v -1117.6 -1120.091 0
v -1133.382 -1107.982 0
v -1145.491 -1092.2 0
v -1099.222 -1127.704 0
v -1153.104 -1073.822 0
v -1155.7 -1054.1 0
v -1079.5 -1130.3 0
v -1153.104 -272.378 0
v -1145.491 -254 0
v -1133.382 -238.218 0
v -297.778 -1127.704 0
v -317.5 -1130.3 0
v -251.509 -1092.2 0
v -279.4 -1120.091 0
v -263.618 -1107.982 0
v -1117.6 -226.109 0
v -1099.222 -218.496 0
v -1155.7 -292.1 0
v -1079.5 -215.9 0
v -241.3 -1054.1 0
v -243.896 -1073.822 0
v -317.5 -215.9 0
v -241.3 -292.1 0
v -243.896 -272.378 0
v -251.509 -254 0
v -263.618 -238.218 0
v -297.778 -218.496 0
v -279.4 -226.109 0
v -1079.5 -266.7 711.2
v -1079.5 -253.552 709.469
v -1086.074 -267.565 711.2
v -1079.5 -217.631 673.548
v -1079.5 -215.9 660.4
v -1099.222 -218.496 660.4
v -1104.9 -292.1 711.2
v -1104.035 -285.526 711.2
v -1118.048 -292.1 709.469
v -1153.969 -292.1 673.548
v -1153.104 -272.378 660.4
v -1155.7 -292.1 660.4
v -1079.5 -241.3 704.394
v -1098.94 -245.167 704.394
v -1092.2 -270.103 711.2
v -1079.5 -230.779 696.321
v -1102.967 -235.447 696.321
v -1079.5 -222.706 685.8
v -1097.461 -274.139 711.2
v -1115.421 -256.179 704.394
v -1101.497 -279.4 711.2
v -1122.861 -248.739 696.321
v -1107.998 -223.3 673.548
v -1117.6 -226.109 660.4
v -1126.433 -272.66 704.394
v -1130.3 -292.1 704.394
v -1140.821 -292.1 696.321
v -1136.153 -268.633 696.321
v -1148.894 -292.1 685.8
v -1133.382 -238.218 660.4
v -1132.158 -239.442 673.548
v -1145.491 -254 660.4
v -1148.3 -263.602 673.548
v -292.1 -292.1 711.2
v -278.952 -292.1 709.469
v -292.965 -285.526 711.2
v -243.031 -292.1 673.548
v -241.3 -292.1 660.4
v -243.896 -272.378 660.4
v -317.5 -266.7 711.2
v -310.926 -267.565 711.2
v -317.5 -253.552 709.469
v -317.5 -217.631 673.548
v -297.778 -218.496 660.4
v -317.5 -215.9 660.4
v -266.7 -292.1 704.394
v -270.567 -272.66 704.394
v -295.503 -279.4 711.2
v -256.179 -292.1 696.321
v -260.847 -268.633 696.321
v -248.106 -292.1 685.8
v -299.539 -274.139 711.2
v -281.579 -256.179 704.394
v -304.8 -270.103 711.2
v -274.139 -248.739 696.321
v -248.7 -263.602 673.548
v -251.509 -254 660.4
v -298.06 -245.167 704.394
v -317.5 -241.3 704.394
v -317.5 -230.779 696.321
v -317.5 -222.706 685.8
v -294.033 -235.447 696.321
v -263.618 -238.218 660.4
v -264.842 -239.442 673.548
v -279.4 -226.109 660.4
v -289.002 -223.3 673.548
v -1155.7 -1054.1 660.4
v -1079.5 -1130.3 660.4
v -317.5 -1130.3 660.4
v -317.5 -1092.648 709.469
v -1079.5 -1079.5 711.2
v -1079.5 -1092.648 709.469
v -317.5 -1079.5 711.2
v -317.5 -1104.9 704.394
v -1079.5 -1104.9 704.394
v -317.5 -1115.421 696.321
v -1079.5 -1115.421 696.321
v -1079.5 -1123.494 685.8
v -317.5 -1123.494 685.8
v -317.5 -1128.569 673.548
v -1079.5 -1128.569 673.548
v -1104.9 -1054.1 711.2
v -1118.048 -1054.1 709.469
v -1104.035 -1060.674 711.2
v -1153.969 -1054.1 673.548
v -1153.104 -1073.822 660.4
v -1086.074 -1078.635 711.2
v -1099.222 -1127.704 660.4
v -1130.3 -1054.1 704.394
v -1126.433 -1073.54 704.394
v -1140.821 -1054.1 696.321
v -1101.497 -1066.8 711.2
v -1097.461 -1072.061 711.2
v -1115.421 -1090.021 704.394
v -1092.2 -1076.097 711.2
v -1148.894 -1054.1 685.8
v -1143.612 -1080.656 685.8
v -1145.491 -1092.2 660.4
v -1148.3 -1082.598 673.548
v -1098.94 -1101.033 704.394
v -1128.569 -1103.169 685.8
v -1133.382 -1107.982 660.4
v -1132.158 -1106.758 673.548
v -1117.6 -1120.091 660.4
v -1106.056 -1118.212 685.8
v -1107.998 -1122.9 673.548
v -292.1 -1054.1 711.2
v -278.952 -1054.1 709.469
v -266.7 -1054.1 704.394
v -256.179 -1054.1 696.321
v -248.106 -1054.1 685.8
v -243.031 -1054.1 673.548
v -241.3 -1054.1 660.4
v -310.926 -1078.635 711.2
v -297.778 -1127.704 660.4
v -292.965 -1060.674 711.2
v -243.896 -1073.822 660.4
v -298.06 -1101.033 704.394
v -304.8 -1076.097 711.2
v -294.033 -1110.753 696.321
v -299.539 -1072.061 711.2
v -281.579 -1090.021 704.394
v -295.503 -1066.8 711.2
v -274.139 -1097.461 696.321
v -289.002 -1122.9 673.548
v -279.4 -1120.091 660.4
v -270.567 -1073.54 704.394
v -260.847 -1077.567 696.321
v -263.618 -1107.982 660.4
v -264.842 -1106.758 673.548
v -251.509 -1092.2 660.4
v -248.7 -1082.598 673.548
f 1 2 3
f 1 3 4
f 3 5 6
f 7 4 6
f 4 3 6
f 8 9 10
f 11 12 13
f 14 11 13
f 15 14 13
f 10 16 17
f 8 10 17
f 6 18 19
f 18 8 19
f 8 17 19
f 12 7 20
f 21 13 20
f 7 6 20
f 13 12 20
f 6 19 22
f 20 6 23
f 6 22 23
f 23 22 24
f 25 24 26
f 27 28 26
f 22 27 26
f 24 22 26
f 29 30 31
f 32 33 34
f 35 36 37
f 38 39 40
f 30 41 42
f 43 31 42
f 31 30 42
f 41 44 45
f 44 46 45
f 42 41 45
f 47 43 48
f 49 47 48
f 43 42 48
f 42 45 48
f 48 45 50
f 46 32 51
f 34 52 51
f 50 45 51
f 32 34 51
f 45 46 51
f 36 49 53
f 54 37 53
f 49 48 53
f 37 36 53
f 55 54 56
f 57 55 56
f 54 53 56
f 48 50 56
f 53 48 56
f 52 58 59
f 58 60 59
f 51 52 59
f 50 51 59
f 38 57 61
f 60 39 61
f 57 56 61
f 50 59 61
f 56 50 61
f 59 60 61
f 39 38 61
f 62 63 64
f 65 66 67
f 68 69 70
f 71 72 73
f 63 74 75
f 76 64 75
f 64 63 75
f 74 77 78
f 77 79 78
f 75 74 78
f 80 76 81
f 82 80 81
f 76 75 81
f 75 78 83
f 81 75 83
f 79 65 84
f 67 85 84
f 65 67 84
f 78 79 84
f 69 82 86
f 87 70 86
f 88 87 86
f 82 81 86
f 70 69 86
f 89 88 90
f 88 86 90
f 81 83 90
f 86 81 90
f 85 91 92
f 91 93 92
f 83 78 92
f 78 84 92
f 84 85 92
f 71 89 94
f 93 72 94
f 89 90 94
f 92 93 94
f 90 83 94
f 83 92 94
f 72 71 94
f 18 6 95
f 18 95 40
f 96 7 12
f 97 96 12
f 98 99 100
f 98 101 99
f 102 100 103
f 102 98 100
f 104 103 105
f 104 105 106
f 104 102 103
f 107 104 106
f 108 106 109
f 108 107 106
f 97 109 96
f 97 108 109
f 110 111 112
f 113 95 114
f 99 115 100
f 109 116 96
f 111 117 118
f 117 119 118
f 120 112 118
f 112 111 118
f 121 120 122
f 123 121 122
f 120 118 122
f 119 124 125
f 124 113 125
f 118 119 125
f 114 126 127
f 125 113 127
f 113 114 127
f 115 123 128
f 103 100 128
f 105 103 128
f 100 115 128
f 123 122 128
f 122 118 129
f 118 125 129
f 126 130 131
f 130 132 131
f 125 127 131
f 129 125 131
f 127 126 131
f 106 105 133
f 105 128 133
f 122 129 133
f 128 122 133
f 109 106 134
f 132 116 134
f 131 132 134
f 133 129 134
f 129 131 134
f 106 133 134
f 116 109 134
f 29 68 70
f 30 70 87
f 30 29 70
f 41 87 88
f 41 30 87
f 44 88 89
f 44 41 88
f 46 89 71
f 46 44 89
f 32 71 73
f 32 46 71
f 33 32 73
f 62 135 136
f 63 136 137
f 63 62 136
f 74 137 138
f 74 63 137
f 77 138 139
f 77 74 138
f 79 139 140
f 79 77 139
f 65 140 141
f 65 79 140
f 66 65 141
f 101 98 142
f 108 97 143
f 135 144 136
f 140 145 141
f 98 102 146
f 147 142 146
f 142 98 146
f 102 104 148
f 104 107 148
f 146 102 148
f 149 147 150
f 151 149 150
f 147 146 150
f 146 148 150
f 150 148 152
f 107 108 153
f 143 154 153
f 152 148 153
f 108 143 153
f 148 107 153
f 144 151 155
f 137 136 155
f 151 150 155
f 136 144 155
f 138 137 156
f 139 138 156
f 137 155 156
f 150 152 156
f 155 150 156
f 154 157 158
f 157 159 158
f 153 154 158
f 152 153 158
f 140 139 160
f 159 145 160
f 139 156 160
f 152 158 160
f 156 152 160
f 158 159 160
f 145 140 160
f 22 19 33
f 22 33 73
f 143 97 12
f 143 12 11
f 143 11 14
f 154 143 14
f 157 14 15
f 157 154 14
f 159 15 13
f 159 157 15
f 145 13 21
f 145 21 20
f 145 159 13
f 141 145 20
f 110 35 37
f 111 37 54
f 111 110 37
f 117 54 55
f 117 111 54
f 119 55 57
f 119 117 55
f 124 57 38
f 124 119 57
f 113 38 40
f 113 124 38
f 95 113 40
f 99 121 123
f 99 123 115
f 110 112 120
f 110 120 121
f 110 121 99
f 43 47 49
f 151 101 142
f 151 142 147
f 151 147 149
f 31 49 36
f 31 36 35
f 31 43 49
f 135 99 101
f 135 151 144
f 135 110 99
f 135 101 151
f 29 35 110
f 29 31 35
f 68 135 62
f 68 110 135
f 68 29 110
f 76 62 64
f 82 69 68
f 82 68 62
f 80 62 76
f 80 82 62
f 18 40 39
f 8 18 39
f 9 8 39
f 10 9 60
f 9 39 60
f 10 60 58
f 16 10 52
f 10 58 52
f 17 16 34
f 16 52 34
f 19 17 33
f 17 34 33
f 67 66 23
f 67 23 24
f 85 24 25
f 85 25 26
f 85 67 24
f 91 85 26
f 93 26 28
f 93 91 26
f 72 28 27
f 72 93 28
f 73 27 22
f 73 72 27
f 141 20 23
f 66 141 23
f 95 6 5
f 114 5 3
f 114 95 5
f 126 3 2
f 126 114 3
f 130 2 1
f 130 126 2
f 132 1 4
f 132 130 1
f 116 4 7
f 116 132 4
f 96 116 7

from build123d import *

# Parameters (mm, degrees)
F0_W     = 914.4
F0_H     = 914.4
F1_DEPTH = 711.2
F2_R     = 76.2
F3_R     = 50.8


with BuildPart() as f1:
    # F0 (on Top) → F1 (new body)
    with BuildSketch(Plane.XY):
        with Locations((-698.5, -673.1)):
            Rectangle(F0_W, F0_H)
    extrude(amount=F1_DEPTH)

    # F2
    f2_edges = [f1.edges().sort_by_distance(p)[0] for p in [
        (-1155.7, -1130.3, 355.6),
        (-1155.7, -215.9, 355.6),
        (-241.3, -1130.3, 355.6),
        (-241.3, -215.9, 355.6),
    ]]
    fillet(f2_edges, radius=F2_R)

    # F3
    f3_edges = [f1.edges().sort_by_distance(p)[0] for p in [
        (-698.5, -1130.3, 711.2),
    ]]
    fillet(f3_edges, radius=F3_R)


solid = f1.part
